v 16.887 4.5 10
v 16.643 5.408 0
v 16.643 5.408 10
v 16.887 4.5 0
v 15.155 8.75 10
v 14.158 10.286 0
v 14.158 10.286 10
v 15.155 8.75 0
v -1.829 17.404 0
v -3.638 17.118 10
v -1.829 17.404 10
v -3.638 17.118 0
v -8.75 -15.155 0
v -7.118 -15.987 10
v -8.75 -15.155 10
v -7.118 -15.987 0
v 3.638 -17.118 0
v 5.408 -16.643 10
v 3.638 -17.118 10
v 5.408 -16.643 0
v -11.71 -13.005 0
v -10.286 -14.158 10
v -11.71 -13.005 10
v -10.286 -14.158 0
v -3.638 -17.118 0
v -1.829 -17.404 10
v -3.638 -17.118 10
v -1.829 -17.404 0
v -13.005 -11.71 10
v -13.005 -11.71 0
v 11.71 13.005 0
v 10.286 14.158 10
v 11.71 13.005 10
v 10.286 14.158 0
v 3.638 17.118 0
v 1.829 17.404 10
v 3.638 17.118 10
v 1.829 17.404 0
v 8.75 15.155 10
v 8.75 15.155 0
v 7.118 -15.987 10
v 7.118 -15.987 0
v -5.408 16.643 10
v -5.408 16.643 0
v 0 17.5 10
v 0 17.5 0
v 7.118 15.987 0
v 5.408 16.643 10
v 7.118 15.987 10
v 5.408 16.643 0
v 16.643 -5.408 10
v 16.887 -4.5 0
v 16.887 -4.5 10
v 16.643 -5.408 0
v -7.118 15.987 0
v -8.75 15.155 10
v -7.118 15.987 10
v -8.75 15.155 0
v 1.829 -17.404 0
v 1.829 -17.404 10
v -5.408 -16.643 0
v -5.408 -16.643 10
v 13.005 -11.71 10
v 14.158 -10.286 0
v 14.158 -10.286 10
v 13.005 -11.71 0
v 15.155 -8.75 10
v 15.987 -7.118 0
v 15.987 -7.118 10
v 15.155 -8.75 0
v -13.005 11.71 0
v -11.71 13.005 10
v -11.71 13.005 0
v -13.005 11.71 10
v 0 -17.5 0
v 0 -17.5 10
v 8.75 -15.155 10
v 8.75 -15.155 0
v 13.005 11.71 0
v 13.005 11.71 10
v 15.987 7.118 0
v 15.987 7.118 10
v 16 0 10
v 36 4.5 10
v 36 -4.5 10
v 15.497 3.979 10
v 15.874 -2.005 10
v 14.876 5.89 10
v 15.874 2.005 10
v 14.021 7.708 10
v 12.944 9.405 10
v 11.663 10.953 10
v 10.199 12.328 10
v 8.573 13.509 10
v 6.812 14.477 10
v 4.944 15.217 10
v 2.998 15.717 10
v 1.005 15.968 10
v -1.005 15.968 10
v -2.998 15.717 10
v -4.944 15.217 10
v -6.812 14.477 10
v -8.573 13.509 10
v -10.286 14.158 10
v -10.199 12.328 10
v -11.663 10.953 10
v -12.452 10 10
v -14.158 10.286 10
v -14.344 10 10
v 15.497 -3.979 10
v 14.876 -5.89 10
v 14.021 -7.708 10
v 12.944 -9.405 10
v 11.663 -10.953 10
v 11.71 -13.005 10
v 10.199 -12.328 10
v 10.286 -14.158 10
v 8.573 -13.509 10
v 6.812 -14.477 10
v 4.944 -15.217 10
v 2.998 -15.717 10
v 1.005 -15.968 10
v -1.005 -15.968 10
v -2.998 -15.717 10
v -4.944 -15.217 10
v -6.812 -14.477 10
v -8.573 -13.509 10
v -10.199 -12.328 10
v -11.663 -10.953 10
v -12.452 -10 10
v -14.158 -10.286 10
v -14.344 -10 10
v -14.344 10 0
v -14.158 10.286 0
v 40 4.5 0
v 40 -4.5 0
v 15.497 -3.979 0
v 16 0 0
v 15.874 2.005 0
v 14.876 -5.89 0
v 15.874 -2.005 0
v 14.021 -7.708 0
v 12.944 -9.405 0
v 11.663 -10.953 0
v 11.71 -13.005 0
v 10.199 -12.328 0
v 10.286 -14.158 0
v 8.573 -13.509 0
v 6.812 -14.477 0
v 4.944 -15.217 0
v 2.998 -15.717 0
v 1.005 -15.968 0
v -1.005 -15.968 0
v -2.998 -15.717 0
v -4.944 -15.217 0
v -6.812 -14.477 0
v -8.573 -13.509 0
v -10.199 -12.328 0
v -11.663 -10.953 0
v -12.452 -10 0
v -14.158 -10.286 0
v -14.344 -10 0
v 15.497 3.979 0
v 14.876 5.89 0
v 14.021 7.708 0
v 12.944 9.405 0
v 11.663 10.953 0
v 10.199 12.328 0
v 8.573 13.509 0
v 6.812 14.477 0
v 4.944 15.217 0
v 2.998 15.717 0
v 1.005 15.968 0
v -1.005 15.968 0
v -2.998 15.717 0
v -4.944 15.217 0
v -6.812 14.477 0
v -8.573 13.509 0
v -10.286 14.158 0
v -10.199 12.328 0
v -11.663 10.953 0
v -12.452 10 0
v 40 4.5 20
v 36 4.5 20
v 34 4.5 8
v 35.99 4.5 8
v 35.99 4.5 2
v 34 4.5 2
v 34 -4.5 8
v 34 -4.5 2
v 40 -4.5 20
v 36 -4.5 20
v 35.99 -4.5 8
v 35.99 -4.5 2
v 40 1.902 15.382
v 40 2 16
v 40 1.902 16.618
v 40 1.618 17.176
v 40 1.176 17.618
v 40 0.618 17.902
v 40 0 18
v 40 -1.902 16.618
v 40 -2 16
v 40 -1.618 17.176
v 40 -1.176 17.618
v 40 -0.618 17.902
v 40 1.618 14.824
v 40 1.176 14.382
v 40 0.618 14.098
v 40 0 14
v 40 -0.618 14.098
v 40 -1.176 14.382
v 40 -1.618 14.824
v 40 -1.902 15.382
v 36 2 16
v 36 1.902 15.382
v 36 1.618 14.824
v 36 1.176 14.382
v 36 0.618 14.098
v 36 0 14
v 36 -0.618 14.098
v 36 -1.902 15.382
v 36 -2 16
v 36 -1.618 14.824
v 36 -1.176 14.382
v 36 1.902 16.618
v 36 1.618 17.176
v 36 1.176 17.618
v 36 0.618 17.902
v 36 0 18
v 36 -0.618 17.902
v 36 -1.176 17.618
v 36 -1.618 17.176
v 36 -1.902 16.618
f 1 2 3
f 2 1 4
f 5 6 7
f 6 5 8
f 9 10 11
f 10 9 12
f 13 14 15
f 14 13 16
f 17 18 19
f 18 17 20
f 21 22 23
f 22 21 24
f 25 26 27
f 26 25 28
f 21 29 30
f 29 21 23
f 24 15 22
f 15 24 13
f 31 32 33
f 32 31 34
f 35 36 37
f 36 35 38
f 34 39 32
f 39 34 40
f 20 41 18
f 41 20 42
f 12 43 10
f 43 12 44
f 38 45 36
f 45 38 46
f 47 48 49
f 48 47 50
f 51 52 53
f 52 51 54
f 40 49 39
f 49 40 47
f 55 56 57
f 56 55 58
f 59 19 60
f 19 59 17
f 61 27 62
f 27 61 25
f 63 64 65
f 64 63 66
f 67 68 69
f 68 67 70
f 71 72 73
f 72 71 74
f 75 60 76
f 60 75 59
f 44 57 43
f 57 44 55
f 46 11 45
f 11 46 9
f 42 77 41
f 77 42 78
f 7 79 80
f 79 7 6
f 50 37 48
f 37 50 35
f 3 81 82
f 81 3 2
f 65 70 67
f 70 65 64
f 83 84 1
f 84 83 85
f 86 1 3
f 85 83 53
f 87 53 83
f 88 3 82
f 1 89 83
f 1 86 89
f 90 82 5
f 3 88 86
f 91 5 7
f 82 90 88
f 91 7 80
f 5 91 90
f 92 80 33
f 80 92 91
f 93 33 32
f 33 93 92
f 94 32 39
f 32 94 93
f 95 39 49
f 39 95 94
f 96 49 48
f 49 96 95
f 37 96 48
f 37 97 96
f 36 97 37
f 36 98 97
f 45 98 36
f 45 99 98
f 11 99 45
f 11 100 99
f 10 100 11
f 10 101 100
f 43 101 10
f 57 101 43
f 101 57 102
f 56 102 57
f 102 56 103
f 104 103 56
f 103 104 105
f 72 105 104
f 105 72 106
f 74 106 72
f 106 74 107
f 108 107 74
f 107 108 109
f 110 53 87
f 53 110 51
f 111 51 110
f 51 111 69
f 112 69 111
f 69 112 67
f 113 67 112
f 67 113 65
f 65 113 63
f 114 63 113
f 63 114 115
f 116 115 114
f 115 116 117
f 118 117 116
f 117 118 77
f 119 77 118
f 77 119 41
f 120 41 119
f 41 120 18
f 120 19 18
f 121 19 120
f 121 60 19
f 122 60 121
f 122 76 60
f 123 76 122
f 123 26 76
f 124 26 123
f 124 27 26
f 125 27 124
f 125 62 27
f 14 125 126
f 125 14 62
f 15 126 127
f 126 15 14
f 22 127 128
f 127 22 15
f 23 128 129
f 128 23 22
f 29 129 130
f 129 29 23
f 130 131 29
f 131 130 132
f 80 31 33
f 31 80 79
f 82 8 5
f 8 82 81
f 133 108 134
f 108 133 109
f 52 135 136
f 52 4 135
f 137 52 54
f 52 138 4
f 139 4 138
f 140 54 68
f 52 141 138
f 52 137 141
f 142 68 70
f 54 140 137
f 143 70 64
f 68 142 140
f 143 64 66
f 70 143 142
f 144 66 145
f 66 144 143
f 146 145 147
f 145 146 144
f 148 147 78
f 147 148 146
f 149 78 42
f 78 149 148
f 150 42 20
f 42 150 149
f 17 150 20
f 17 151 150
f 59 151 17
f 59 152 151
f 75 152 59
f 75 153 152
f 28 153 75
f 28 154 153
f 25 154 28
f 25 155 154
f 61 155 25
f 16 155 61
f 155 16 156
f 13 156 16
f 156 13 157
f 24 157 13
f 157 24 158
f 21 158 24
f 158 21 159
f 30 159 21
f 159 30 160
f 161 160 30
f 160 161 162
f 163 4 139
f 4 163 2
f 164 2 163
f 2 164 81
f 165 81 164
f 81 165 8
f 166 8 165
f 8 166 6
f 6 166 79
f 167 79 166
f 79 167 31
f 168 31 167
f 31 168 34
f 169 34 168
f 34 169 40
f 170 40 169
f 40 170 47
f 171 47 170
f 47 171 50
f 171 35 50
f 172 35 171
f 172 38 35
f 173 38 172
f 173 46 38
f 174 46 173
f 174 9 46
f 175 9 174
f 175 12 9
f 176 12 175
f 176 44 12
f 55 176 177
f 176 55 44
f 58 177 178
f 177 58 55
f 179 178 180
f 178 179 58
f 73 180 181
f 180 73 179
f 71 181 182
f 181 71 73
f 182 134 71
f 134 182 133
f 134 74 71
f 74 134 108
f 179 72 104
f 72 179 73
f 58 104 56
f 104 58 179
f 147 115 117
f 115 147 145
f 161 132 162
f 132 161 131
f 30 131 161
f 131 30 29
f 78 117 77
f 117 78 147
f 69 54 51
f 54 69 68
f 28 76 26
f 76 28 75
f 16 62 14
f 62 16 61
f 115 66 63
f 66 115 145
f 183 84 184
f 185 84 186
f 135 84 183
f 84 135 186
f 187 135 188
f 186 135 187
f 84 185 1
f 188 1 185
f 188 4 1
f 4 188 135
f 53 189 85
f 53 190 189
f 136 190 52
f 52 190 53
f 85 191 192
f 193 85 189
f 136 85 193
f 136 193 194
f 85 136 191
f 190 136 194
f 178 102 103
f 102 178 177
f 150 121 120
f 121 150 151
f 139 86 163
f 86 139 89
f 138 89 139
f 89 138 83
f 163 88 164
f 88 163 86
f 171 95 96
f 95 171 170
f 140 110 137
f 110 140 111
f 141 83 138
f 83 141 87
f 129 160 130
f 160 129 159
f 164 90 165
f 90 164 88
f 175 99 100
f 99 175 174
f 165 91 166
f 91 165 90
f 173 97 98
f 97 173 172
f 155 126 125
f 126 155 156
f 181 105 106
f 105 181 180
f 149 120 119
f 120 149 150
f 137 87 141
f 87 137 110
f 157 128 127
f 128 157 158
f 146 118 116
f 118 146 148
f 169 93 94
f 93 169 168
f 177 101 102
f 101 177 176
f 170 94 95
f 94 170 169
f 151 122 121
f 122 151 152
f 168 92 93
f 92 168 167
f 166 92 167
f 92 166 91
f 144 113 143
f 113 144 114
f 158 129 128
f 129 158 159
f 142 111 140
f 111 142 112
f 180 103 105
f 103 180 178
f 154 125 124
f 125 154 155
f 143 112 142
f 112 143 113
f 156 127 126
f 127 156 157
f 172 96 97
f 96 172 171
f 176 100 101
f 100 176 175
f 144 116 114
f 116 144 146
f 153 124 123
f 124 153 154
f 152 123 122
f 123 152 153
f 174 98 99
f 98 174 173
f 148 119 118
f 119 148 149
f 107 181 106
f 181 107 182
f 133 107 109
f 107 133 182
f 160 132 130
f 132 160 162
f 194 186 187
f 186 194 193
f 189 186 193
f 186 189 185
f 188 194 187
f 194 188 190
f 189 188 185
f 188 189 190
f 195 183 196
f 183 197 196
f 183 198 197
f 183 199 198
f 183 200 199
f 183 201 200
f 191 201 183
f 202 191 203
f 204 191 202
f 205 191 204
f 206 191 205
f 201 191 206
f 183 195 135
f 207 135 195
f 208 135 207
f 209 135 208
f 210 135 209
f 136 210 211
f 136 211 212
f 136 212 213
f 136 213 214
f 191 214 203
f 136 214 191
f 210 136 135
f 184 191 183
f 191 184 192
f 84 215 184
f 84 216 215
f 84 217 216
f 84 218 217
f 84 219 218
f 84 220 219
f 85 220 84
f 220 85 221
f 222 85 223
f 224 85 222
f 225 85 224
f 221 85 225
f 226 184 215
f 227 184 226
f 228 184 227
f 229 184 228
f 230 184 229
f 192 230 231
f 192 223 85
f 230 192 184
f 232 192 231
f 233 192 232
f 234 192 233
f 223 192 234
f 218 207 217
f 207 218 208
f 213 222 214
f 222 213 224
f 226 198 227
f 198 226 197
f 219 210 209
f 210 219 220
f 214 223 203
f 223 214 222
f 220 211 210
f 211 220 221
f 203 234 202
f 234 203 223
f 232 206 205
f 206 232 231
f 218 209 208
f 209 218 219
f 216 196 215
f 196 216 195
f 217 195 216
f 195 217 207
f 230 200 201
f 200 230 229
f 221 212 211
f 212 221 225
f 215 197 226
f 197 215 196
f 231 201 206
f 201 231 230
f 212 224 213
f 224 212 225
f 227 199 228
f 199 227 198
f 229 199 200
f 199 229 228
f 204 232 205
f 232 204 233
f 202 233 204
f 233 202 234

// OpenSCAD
difference(){
  union(){
  cylinder(d=35,h=10,$fn=60);
    translate([16,-4.5]) cube([22,9,10]);
  }
  translate([0,0,-.01]) cylinder(d=32,h=10.02,$fn=50);
  translate([-20,-10,-.01]) cube([10,20,10.02]);
  translate([34,-4.51,2]) cube([1.99,9.02,6]);
}
translate([36,-4.5]) difference() {
  cube([4,9,20]);
  translate([-.01,4.5,16]) rotate([0,90,0]) cylinder(d=4,h=10,$fn=20);
}
*translate([17.5+20,-4.5]) {
  cube([10,9,16]);
  translate([10,0]) cube([3,9,18]);
}
